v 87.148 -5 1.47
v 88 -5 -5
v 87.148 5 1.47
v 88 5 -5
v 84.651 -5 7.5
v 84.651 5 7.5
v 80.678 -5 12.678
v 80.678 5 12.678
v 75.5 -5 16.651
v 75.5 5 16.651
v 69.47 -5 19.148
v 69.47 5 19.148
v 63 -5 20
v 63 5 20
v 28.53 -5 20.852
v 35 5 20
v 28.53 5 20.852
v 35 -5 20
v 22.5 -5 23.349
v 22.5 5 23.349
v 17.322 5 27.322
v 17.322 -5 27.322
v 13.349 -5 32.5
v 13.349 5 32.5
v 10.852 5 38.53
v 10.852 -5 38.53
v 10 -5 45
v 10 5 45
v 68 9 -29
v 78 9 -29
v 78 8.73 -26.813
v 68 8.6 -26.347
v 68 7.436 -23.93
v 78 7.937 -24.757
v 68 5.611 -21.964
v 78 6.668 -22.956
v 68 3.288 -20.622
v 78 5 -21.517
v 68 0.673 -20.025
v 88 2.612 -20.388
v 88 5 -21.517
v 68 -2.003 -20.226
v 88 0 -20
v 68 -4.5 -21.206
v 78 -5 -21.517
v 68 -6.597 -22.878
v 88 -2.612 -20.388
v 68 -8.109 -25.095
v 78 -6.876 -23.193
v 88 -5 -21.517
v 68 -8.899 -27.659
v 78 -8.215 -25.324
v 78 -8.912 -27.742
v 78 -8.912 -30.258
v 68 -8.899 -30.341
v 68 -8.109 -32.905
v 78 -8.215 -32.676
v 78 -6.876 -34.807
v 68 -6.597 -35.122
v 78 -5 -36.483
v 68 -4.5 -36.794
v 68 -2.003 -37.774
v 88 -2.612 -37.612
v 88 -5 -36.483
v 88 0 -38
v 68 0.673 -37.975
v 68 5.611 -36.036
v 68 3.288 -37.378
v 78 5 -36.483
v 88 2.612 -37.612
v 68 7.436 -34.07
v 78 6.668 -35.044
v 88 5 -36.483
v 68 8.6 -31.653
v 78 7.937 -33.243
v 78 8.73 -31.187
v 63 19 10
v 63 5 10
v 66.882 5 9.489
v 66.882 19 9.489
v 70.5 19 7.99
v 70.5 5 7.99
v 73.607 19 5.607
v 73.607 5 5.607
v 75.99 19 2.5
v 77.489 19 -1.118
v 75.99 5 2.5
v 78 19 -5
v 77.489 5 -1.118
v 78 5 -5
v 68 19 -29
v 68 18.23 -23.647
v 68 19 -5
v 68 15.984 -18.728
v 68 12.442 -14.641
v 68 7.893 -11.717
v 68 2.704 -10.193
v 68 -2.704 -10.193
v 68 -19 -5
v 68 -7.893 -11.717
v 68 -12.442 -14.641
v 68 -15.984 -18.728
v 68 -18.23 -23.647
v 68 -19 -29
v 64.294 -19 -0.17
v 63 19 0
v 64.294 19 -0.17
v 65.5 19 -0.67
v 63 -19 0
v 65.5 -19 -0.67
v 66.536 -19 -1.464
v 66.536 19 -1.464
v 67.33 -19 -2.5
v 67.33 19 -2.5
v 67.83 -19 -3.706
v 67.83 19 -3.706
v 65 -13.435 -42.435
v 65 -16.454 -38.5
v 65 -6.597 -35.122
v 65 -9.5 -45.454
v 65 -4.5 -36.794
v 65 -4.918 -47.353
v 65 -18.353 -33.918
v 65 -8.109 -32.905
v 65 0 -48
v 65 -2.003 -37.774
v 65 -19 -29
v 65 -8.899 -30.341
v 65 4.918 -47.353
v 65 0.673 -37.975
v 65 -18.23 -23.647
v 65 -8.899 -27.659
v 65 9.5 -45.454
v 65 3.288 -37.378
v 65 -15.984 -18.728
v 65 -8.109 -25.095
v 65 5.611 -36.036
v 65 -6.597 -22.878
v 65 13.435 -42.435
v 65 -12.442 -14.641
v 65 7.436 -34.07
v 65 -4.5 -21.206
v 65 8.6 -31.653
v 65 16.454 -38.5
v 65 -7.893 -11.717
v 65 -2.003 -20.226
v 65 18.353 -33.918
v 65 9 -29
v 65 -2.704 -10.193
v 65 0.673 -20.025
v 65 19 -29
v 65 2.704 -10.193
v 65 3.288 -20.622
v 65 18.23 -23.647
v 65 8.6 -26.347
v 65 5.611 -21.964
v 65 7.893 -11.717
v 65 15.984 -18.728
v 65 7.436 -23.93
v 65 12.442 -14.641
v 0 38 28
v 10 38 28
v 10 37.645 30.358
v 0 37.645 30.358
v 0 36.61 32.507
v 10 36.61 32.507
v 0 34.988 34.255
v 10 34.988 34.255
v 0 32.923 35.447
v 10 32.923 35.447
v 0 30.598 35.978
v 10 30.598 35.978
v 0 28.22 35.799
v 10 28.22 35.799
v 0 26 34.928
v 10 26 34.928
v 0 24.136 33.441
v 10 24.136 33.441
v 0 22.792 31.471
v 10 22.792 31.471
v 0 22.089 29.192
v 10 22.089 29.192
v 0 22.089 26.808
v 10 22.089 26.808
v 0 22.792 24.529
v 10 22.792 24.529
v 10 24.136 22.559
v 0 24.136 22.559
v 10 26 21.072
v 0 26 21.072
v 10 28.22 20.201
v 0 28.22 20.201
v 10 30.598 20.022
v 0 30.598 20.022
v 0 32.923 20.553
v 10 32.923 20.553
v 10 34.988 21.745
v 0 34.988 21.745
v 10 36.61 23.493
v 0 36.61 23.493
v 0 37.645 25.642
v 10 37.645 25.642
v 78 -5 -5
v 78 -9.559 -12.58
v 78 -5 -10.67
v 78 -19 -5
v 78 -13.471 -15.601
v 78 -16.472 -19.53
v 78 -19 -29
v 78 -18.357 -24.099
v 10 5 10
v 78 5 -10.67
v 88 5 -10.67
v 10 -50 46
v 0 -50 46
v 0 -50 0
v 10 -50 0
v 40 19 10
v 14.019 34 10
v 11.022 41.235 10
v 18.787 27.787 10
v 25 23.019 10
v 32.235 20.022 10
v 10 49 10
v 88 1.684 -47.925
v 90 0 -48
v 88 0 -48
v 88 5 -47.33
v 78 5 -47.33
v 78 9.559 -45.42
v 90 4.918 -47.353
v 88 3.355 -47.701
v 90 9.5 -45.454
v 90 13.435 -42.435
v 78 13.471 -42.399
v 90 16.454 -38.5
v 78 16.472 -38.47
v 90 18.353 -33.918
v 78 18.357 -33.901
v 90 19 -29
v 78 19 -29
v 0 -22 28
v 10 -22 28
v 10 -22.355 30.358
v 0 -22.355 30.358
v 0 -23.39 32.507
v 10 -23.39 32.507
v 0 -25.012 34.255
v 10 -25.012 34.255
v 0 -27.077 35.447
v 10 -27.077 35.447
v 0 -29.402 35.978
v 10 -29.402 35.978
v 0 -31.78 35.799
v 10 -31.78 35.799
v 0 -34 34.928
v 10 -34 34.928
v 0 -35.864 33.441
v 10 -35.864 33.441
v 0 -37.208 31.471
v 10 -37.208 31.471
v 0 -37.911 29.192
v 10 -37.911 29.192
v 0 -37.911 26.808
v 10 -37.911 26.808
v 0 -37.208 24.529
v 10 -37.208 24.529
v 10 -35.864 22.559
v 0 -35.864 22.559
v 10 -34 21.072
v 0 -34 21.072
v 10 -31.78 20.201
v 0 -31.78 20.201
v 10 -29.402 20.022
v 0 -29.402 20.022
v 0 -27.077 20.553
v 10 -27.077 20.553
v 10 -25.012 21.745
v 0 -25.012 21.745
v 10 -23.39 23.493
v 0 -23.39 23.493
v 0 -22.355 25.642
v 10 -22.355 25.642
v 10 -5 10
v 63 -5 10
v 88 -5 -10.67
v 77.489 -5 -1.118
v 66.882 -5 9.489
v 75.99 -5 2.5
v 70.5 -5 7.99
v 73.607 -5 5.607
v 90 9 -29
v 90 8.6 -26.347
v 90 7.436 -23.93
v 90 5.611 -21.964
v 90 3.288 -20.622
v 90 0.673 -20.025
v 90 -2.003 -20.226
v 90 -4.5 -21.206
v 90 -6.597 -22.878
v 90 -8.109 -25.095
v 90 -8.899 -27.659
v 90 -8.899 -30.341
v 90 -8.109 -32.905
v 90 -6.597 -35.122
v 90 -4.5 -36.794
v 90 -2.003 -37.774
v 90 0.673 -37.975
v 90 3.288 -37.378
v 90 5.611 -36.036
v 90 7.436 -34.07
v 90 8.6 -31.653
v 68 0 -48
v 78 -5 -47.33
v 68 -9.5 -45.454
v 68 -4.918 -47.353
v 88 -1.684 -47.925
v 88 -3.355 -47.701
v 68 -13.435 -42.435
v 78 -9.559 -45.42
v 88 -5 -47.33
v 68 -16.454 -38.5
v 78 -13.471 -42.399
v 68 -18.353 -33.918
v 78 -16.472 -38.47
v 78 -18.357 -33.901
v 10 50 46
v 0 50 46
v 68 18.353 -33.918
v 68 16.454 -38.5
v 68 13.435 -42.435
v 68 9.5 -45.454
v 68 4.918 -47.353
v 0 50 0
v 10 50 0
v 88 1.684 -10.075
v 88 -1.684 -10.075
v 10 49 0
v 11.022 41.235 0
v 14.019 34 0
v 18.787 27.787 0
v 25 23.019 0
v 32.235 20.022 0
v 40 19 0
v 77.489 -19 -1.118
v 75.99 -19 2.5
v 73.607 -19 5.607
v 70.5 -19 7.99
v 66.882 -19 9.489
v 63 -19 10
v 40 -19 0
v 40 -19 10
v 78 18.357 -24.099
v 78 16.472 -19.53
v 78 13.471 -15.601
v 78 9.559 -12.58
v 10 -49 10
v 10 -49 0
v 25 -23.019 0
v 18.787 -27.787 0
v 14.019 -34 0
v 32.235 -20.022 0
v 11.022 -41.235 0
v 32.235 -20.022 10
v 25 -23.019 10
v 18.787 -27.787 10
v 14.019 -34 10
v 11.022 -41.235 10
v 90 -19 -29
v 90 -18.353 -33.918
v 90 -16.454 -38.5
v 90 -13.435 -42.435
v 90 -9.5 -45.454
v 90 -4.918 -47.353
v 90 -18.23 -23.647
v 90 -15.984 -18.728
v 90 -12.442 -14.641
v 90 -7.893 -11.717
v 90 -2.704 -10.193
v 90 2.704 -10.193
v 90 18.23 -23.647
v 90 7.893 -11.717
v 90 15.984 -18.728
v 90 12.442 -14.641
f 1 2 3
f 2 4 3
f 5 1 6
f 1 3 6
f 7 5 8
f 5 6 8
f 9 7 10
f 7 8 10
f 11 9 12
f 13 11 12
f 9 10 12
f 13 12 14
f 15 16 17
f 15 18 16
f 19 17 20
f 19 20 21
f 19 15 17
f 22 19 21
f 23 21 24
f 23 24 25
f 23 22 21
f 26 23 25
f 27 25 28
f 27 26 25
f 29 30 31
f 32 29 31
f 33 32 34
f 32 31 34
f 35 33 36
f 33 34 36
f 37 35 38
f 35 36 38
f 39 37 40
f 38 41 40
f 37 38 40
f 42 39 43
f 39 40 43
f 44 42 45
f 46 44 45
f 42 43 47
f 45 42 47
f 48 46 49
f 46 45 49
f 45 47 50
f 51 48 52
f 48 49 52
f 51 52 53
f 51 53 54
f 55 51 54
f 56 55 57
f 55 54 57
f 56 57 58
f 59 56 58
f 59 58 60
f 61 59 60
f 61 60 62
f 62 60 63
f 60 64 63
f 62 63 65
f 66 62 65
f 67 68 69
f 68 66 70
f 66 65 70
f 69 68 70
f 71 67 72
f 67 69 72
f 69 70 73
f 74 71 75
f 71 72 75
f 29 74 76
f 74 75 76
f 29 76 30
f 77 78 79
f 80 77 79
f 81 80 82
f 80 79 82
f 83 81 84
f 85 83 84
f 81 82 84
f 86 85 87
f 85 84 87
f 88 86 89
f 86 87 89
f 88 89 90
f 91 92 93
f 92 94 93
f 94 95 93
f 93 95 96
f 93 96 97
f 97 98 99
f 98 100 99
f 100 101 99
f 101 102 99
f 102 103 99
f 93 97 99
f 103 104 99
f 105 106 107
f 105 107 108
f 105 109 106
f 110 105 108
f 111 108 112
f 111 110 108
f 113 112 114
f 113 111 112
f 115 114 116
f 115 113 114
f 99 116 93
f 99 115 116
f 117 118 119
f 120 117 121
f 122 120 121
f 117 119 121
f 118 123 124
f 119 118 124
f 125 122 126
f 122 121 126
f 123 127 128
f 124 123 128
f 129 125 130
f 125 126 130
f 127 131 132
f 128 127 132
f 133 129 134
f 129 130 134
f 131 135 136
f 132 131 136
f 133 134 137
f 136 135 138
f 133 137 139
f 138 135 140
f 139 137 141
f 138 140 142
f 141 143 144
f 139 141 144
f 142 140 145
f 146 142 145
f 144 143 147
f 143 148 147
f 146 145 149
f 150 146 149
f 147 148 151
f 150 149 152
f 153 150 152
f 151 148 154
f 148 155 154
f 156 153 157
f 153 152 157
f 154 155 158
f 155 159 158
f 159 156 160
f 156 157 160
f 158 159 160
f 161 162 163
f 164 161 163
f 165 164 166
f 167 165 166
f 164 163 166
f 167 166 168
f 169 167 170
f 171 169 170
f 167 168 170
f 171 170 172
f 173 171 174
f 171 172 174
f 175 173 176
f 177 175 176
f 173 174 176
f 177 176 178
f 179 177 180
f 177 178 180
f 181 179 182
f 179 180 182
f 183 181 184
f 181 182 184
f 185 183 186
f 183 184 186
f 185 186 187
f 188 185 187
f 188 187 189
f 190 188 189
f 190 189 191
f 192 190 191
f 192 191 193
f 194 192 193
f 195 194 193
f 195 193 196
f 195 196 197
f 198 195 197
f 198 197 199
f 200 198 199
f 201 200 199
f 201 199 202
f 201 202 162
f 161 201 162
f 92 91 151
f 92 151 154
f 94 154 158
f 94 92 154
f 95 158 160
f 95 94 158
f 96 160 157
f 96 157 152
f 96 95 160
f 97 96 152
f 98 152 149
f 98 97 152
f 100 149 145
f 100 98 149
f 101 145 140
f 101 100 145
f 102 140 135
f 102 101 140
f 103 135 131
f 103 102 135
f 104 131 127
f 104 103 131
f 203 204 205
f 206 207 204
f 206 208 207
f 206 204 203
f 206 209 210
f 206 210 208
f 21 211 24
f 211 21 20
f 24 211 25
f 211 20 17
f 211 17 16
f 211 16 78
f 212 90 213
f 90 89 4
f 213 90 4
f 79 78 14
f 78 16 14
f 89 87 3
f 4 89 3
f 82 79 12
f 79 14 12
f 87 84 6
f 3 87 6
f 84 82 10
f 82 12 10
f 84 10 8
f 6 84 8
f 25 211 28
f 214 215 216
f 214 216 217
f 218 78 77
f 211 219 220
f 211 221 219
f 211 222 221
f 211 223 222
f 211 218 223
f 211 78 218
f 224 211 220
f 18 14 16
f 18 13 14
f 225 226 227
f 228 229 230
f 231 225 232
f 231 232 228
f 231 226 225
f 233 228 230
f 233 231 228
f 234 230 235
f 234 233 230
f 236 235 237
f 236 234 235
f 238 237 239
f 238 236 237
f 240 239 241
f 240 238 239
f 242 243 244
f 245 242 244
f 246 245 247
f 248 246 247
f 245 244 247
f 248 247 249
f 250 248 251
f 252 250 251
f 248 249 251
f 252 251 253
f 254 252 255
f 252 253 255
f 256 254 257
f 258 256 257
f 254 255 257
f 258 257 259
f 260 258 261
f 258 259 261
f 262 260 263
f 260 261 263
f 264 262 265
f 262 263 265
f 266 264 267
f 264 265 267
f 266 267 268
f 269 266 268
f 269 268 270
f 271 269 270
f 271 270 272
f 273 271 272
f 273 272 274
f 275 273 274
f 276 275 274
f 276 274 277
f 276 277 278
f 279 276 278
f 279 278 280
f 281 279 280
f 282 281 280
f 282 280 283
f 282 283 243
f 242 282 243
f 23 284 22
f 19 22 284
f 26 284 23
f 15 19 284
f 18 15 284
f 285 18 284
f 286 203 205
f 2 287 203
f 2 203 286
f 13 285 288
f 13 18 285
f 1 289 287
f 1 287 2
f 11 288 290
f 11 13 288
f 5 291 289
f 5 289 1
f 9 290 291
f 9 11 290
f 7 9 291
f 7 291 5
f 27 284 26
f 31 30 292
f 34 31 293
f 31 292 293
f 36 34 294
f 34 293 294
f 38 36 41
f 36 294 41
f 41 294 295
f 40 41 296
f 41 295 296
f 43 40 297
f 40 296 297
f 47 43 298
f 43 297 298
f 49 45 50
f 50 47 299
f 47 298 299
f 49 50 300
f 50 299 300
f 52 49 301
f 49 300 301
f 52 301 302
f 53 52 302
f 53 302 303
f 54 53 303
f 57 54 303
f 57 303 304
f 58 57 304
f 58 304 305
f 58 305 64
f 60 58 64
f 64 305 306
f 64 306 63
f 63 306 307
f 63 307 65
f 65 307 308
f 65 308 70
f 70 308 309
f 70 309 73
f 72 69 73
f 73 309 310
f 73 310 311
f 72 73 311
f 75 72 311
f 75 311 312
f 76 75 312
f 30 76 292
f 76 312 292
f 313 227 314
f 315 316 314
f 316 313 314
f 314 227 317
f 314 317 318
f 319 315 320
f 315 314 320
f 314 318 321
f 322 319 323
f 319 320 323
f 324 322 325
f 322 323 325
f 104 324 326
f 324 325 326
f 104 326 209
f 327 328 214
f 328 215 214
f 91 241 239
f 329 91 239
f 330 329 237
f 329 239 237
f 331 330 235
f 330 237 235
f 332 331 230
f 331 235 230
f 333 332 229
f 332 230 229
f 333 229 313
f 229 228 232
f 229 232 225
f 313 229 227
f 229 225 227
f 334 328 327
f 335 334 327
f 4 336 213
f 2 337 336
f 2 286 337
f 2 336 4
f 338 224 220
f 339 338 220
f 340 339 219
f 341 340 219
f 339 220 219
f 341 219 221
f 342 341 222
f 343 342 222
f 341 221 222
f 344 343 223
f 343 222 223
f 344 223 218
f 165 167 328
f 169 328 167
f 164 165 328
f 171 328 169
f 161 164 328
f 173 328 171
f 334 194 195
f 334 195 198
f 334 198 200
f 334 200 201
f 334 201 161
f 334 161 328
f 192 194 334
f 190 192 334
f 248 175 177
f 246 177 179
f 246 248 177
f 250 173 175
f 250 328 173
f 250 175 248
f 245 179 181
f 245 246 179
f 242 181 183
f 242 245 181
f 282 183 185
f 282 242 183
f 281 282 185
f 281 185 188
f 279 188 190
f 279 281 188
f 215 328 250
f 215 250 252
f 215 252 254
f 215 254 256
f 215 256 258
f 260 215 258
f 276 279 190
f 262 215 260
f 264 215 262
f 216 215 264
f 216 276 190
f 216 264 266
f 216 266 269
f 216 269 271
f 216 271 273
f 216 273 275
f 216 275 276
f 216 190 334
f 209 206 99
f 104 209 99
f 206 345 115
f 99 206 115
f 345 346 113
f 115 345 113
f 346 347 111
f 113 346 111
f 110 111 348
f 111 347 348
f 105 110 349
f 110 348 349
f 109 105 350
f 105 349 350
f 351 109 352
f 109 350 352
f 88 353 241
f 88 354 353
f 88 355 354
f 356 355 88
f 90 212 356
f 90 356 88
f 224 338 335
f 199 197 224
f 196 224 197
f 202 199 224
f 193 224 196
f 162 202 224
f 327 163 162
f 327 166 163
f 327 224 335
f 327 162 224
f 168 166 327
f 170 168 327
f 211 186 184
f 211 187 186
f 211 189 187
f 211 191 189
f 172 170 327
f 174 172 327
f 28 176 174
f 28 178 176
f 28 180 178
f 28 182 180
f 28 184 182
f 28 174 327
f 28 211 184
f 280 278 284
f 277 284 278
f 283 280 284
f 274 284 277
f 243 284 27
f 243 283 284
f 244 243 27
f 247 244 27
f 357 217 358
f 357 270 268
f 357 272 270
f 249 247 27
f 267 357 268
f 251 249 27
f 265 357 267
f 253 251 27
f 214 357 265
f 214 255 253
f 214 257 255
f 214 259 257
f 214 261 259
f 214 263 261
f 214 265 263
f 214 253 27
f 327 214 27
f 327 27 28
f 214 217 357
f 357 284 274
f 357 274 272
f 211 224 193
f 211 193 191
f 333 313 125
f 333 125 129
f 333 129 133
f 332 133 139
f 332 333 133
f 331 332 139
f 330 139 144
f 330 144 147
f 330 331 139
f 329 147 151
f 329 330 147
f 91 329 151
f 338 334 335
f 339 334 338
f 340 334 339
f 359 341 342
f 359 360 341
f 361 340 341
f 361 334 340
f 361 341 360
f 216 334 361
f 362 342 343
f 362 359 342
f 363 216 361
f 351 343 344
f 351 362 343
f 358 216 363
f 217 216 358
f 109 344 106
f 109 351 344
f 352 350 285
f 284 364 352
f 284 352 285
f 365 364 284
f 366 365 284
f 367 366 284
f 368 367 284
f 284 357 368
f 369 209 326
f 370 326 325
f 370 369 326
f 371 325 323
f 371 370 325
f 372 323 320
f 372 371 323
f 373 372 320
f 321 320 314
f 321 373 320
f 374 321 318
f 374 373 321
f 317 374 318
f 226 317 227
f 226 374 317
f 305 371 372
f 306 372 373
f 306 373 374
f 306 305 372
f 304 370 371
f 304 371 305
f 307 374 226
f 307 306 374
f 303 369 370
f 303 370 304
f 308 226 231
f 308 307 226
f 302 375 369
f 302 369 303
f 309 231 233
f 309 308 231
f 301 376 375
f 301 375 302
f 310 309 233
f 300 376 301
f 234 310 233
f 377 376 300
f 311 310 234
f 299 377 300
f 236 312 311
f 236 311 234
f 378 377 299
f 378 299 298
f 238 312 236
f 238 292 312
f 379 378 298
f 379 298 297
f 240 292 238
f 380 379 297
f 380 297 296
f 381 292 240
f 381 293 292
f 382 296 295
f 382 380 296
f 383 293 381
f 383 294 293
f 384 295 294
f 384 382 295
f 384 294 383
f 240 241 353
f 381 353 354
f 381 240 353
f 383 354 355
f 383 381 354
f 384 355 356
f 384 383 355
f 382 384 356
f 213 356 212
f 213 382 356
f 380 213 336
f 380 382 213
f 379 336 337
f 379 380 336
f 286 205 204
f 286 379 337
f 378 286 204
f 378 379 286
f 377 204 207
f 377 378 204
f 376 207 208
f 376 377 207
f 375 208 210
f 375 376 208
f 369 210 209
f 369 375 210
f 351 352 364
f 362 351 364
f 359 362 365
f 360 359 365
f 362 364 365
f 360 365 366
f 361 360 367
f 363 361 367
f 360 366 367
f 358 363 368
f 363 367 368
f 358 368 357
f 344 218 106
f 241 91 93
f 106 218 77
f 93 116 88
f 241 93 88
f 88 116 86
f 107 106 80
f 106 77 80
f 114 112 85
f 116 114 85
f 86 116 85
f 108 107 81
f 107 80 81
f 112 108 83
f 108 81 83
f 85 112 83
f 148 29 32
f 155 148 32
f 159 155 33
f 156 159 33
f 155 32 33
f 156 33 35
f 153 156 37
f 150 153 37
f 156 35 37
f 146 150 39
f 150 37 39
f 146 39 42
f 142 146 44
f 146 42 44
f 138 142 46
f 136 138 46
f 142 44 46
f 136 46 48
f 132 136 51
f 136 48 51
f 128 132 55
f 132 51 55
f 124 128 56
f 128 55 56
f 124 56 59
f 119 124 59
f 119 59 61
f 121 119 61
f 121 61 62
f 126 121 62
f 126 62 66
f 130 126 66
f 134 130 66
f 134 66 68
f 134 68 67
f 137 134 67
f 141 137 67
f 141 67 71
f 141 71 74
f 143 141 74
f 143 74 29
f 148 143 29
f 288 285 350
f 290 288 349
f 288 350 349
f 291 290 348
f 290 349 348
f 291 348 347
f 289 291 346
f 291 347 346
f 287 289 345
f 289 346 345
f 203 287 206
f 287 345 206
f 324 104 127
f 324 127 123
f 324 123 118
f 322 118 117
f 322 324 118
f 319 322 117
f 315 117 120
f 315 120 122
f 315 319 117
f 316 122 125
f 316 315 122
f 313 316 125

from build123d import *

# Parameters (mm, degrees)
F0_W      = 10
F0_H      = 36
F0_H_2    = 10
F0_W_2    = 58
F0_H_3    = 48
F1_DEPTH  = 50
F4_DEPTH  = 58.001
F2_R      = 8
F5_DEPTH  = 25
F6_R      = 15
F7_R      = 5
F9_DEPTH  = 5
F10_R     = 25
F13_DEPTH = 25
F12_R     = 9
F14_DEPTH = 25
F15_DEPTH = 25


# Not quite as in the source:
# - after a boolean that leaves OpenCascade's solid faulty, fix() repairs it


with BuildPart() as f1:
    # F0 (on Front) → F1 (new body, symmetric)
    with BuildSketch(Plane.XZ):
        with Locations((5, 28)):
            Rectangle(F0_W, F0_H)
        with Locations((5, 5)):
            Rectangle(F0_W, F0_H_2)
        with Locations((39, 5)):
            Rectangle(F0_W_2, F0_H_2)
        with Locations((73, 5)):
            Rectangle(F0_W, F0_H_2)
        with Locations((73, -24)):
            Rectangle(F0_W, F0_H_3)
    extrude(amount=F1_DEPTH, both=True)

    # F3 (on face) → F4 (cut, through all)
    with BuildSketch(Plane.XY.offset(10)):
        with BuildLine():
            Line((78, -19), (40, -19))
            ThreePointArc((40, -19), (18.7867965644, -27.7867965644), (10, -49))
            Line((10, -49), (10, -50))
            Line((10, -50), (78, -50))
            Line((78, -50), (78, -19))
        make_face()
        with BuildLine():
            ThreePointArc((10, 49), (18.7867965644, 27.7867965644), (40, 19))
            Line((40, 19), (78, 19))
            Line((78, 19), (78, 50))
            Line((78, 50), (10, 50))
            Line((10, 50), (10, 49))
        make_face()
    extrude(amount=-F4_DEPTH, mode=Mode.SUBTRACT)

    # F2 (on face) → F5 (cut)
    with BuildSketch(Plane.YZ.offset(10)):
        with Locations((30, 28)):
            Circle(F2_R)
        with Locations((-30, 28)):
            Circle(F2_R)
    extrude(amount=-F5_DEPTH, mode=Mode.SUBTRACT)

    # F6
    f6_edges = [f1.edges().sort_by_distance(p)[0] for p in [
        (78, 0, 10),
    ]]
    fillet(f6_edges, radius=F6_R)

    # F7
    f7_edges = [f1.edges().sort_by_distance(p)[0] for p in [
        (68, 0, 0),
    ]]
    fillet(f7_edges, radius=F7_R)

    # F8 (on Front) → F9 (join, symmetric)
    with BuildSketch(Plane.XZ):
        with BuildLine():
            ThreePointArc((35, 20), (17.3223304703, 27.3223304703), (10, 45))
            Line((10, 45), (10, 10))
            Line((10, 10), (40, 10))
            Line((40, 10), (63, 10))
            ThreePointArc((63, 10), (73.6066017178, 5.6066017178), (78, -5))
            Line((78, -5), (78, -48))
            Line((78, -48), (88, -48))
            Line((88, -48), (88, 20))
            Line((88, 20), (35, 20))
        make_face()
    extrude(amount=F9_DEPTH, both=True)

    # F10
    f10_edges = [f1.edges().sort_by_distance(p)[0] for p in [
        (88, 0, 20),
    ]]
    fillet(f10_edges, radius=F10_R)

    # F12 (on offset) → F13 (cut)
    with BuildSketch(Plane.YZ.offset(90)):
        with BuildLine():
            ThreePointArc((0, -48), (-13.4350288425, -42.4350288425), (-19, -29))
            Line((-19, -29), (-19, -48))
            Line((-19, -48), (-5, -48))
            Line((-5, -48), (0, -48))
        make_face()
        with BuildLine():
            Line((19, -48), (19, -29))
            ThreePointArc((19, -29), (13.4350288425, -42.4350288425), (0, -48))
            Line((0, -48), (5, -48))
            Line((5, -48), (19, -48))
        make_face()
    extrude(amount=-F13_DEPTH, mode=Mode.SUBTRACT)

    # F12 (on offset) → F14 (join)
    with BuildSketch(Plane.YZ.offset(90)):
        with BuildLine():
            ThreePointArc((0, -48), (13.4350288425, -42.4350288425), (19, -29))
            ThreePointArc((19, -29), (0, -10), (-19, -29))
            ThreePointArc((-19, -29), (-13.4350288425, -42.4350288425), (0, -48))
        make_face()
        with Locations((0, -29)):
            Circle(F12_R, mode=Mode.SUBTRACT)
    extrude(amount=-F14_DEPTH)

    add(f1.part.fix(), mode=Mode.REPLACE)

    # F12 (on offset) → F15 (cut)
    with BuildSketch(Plane.YZ.offset(90)):
        with Locations((0, -29)):
            Circle(F12_R)
    extrude(amount=-F15_DEPTH, mode=Mode.SUBTRACT)


solid = f1.part
